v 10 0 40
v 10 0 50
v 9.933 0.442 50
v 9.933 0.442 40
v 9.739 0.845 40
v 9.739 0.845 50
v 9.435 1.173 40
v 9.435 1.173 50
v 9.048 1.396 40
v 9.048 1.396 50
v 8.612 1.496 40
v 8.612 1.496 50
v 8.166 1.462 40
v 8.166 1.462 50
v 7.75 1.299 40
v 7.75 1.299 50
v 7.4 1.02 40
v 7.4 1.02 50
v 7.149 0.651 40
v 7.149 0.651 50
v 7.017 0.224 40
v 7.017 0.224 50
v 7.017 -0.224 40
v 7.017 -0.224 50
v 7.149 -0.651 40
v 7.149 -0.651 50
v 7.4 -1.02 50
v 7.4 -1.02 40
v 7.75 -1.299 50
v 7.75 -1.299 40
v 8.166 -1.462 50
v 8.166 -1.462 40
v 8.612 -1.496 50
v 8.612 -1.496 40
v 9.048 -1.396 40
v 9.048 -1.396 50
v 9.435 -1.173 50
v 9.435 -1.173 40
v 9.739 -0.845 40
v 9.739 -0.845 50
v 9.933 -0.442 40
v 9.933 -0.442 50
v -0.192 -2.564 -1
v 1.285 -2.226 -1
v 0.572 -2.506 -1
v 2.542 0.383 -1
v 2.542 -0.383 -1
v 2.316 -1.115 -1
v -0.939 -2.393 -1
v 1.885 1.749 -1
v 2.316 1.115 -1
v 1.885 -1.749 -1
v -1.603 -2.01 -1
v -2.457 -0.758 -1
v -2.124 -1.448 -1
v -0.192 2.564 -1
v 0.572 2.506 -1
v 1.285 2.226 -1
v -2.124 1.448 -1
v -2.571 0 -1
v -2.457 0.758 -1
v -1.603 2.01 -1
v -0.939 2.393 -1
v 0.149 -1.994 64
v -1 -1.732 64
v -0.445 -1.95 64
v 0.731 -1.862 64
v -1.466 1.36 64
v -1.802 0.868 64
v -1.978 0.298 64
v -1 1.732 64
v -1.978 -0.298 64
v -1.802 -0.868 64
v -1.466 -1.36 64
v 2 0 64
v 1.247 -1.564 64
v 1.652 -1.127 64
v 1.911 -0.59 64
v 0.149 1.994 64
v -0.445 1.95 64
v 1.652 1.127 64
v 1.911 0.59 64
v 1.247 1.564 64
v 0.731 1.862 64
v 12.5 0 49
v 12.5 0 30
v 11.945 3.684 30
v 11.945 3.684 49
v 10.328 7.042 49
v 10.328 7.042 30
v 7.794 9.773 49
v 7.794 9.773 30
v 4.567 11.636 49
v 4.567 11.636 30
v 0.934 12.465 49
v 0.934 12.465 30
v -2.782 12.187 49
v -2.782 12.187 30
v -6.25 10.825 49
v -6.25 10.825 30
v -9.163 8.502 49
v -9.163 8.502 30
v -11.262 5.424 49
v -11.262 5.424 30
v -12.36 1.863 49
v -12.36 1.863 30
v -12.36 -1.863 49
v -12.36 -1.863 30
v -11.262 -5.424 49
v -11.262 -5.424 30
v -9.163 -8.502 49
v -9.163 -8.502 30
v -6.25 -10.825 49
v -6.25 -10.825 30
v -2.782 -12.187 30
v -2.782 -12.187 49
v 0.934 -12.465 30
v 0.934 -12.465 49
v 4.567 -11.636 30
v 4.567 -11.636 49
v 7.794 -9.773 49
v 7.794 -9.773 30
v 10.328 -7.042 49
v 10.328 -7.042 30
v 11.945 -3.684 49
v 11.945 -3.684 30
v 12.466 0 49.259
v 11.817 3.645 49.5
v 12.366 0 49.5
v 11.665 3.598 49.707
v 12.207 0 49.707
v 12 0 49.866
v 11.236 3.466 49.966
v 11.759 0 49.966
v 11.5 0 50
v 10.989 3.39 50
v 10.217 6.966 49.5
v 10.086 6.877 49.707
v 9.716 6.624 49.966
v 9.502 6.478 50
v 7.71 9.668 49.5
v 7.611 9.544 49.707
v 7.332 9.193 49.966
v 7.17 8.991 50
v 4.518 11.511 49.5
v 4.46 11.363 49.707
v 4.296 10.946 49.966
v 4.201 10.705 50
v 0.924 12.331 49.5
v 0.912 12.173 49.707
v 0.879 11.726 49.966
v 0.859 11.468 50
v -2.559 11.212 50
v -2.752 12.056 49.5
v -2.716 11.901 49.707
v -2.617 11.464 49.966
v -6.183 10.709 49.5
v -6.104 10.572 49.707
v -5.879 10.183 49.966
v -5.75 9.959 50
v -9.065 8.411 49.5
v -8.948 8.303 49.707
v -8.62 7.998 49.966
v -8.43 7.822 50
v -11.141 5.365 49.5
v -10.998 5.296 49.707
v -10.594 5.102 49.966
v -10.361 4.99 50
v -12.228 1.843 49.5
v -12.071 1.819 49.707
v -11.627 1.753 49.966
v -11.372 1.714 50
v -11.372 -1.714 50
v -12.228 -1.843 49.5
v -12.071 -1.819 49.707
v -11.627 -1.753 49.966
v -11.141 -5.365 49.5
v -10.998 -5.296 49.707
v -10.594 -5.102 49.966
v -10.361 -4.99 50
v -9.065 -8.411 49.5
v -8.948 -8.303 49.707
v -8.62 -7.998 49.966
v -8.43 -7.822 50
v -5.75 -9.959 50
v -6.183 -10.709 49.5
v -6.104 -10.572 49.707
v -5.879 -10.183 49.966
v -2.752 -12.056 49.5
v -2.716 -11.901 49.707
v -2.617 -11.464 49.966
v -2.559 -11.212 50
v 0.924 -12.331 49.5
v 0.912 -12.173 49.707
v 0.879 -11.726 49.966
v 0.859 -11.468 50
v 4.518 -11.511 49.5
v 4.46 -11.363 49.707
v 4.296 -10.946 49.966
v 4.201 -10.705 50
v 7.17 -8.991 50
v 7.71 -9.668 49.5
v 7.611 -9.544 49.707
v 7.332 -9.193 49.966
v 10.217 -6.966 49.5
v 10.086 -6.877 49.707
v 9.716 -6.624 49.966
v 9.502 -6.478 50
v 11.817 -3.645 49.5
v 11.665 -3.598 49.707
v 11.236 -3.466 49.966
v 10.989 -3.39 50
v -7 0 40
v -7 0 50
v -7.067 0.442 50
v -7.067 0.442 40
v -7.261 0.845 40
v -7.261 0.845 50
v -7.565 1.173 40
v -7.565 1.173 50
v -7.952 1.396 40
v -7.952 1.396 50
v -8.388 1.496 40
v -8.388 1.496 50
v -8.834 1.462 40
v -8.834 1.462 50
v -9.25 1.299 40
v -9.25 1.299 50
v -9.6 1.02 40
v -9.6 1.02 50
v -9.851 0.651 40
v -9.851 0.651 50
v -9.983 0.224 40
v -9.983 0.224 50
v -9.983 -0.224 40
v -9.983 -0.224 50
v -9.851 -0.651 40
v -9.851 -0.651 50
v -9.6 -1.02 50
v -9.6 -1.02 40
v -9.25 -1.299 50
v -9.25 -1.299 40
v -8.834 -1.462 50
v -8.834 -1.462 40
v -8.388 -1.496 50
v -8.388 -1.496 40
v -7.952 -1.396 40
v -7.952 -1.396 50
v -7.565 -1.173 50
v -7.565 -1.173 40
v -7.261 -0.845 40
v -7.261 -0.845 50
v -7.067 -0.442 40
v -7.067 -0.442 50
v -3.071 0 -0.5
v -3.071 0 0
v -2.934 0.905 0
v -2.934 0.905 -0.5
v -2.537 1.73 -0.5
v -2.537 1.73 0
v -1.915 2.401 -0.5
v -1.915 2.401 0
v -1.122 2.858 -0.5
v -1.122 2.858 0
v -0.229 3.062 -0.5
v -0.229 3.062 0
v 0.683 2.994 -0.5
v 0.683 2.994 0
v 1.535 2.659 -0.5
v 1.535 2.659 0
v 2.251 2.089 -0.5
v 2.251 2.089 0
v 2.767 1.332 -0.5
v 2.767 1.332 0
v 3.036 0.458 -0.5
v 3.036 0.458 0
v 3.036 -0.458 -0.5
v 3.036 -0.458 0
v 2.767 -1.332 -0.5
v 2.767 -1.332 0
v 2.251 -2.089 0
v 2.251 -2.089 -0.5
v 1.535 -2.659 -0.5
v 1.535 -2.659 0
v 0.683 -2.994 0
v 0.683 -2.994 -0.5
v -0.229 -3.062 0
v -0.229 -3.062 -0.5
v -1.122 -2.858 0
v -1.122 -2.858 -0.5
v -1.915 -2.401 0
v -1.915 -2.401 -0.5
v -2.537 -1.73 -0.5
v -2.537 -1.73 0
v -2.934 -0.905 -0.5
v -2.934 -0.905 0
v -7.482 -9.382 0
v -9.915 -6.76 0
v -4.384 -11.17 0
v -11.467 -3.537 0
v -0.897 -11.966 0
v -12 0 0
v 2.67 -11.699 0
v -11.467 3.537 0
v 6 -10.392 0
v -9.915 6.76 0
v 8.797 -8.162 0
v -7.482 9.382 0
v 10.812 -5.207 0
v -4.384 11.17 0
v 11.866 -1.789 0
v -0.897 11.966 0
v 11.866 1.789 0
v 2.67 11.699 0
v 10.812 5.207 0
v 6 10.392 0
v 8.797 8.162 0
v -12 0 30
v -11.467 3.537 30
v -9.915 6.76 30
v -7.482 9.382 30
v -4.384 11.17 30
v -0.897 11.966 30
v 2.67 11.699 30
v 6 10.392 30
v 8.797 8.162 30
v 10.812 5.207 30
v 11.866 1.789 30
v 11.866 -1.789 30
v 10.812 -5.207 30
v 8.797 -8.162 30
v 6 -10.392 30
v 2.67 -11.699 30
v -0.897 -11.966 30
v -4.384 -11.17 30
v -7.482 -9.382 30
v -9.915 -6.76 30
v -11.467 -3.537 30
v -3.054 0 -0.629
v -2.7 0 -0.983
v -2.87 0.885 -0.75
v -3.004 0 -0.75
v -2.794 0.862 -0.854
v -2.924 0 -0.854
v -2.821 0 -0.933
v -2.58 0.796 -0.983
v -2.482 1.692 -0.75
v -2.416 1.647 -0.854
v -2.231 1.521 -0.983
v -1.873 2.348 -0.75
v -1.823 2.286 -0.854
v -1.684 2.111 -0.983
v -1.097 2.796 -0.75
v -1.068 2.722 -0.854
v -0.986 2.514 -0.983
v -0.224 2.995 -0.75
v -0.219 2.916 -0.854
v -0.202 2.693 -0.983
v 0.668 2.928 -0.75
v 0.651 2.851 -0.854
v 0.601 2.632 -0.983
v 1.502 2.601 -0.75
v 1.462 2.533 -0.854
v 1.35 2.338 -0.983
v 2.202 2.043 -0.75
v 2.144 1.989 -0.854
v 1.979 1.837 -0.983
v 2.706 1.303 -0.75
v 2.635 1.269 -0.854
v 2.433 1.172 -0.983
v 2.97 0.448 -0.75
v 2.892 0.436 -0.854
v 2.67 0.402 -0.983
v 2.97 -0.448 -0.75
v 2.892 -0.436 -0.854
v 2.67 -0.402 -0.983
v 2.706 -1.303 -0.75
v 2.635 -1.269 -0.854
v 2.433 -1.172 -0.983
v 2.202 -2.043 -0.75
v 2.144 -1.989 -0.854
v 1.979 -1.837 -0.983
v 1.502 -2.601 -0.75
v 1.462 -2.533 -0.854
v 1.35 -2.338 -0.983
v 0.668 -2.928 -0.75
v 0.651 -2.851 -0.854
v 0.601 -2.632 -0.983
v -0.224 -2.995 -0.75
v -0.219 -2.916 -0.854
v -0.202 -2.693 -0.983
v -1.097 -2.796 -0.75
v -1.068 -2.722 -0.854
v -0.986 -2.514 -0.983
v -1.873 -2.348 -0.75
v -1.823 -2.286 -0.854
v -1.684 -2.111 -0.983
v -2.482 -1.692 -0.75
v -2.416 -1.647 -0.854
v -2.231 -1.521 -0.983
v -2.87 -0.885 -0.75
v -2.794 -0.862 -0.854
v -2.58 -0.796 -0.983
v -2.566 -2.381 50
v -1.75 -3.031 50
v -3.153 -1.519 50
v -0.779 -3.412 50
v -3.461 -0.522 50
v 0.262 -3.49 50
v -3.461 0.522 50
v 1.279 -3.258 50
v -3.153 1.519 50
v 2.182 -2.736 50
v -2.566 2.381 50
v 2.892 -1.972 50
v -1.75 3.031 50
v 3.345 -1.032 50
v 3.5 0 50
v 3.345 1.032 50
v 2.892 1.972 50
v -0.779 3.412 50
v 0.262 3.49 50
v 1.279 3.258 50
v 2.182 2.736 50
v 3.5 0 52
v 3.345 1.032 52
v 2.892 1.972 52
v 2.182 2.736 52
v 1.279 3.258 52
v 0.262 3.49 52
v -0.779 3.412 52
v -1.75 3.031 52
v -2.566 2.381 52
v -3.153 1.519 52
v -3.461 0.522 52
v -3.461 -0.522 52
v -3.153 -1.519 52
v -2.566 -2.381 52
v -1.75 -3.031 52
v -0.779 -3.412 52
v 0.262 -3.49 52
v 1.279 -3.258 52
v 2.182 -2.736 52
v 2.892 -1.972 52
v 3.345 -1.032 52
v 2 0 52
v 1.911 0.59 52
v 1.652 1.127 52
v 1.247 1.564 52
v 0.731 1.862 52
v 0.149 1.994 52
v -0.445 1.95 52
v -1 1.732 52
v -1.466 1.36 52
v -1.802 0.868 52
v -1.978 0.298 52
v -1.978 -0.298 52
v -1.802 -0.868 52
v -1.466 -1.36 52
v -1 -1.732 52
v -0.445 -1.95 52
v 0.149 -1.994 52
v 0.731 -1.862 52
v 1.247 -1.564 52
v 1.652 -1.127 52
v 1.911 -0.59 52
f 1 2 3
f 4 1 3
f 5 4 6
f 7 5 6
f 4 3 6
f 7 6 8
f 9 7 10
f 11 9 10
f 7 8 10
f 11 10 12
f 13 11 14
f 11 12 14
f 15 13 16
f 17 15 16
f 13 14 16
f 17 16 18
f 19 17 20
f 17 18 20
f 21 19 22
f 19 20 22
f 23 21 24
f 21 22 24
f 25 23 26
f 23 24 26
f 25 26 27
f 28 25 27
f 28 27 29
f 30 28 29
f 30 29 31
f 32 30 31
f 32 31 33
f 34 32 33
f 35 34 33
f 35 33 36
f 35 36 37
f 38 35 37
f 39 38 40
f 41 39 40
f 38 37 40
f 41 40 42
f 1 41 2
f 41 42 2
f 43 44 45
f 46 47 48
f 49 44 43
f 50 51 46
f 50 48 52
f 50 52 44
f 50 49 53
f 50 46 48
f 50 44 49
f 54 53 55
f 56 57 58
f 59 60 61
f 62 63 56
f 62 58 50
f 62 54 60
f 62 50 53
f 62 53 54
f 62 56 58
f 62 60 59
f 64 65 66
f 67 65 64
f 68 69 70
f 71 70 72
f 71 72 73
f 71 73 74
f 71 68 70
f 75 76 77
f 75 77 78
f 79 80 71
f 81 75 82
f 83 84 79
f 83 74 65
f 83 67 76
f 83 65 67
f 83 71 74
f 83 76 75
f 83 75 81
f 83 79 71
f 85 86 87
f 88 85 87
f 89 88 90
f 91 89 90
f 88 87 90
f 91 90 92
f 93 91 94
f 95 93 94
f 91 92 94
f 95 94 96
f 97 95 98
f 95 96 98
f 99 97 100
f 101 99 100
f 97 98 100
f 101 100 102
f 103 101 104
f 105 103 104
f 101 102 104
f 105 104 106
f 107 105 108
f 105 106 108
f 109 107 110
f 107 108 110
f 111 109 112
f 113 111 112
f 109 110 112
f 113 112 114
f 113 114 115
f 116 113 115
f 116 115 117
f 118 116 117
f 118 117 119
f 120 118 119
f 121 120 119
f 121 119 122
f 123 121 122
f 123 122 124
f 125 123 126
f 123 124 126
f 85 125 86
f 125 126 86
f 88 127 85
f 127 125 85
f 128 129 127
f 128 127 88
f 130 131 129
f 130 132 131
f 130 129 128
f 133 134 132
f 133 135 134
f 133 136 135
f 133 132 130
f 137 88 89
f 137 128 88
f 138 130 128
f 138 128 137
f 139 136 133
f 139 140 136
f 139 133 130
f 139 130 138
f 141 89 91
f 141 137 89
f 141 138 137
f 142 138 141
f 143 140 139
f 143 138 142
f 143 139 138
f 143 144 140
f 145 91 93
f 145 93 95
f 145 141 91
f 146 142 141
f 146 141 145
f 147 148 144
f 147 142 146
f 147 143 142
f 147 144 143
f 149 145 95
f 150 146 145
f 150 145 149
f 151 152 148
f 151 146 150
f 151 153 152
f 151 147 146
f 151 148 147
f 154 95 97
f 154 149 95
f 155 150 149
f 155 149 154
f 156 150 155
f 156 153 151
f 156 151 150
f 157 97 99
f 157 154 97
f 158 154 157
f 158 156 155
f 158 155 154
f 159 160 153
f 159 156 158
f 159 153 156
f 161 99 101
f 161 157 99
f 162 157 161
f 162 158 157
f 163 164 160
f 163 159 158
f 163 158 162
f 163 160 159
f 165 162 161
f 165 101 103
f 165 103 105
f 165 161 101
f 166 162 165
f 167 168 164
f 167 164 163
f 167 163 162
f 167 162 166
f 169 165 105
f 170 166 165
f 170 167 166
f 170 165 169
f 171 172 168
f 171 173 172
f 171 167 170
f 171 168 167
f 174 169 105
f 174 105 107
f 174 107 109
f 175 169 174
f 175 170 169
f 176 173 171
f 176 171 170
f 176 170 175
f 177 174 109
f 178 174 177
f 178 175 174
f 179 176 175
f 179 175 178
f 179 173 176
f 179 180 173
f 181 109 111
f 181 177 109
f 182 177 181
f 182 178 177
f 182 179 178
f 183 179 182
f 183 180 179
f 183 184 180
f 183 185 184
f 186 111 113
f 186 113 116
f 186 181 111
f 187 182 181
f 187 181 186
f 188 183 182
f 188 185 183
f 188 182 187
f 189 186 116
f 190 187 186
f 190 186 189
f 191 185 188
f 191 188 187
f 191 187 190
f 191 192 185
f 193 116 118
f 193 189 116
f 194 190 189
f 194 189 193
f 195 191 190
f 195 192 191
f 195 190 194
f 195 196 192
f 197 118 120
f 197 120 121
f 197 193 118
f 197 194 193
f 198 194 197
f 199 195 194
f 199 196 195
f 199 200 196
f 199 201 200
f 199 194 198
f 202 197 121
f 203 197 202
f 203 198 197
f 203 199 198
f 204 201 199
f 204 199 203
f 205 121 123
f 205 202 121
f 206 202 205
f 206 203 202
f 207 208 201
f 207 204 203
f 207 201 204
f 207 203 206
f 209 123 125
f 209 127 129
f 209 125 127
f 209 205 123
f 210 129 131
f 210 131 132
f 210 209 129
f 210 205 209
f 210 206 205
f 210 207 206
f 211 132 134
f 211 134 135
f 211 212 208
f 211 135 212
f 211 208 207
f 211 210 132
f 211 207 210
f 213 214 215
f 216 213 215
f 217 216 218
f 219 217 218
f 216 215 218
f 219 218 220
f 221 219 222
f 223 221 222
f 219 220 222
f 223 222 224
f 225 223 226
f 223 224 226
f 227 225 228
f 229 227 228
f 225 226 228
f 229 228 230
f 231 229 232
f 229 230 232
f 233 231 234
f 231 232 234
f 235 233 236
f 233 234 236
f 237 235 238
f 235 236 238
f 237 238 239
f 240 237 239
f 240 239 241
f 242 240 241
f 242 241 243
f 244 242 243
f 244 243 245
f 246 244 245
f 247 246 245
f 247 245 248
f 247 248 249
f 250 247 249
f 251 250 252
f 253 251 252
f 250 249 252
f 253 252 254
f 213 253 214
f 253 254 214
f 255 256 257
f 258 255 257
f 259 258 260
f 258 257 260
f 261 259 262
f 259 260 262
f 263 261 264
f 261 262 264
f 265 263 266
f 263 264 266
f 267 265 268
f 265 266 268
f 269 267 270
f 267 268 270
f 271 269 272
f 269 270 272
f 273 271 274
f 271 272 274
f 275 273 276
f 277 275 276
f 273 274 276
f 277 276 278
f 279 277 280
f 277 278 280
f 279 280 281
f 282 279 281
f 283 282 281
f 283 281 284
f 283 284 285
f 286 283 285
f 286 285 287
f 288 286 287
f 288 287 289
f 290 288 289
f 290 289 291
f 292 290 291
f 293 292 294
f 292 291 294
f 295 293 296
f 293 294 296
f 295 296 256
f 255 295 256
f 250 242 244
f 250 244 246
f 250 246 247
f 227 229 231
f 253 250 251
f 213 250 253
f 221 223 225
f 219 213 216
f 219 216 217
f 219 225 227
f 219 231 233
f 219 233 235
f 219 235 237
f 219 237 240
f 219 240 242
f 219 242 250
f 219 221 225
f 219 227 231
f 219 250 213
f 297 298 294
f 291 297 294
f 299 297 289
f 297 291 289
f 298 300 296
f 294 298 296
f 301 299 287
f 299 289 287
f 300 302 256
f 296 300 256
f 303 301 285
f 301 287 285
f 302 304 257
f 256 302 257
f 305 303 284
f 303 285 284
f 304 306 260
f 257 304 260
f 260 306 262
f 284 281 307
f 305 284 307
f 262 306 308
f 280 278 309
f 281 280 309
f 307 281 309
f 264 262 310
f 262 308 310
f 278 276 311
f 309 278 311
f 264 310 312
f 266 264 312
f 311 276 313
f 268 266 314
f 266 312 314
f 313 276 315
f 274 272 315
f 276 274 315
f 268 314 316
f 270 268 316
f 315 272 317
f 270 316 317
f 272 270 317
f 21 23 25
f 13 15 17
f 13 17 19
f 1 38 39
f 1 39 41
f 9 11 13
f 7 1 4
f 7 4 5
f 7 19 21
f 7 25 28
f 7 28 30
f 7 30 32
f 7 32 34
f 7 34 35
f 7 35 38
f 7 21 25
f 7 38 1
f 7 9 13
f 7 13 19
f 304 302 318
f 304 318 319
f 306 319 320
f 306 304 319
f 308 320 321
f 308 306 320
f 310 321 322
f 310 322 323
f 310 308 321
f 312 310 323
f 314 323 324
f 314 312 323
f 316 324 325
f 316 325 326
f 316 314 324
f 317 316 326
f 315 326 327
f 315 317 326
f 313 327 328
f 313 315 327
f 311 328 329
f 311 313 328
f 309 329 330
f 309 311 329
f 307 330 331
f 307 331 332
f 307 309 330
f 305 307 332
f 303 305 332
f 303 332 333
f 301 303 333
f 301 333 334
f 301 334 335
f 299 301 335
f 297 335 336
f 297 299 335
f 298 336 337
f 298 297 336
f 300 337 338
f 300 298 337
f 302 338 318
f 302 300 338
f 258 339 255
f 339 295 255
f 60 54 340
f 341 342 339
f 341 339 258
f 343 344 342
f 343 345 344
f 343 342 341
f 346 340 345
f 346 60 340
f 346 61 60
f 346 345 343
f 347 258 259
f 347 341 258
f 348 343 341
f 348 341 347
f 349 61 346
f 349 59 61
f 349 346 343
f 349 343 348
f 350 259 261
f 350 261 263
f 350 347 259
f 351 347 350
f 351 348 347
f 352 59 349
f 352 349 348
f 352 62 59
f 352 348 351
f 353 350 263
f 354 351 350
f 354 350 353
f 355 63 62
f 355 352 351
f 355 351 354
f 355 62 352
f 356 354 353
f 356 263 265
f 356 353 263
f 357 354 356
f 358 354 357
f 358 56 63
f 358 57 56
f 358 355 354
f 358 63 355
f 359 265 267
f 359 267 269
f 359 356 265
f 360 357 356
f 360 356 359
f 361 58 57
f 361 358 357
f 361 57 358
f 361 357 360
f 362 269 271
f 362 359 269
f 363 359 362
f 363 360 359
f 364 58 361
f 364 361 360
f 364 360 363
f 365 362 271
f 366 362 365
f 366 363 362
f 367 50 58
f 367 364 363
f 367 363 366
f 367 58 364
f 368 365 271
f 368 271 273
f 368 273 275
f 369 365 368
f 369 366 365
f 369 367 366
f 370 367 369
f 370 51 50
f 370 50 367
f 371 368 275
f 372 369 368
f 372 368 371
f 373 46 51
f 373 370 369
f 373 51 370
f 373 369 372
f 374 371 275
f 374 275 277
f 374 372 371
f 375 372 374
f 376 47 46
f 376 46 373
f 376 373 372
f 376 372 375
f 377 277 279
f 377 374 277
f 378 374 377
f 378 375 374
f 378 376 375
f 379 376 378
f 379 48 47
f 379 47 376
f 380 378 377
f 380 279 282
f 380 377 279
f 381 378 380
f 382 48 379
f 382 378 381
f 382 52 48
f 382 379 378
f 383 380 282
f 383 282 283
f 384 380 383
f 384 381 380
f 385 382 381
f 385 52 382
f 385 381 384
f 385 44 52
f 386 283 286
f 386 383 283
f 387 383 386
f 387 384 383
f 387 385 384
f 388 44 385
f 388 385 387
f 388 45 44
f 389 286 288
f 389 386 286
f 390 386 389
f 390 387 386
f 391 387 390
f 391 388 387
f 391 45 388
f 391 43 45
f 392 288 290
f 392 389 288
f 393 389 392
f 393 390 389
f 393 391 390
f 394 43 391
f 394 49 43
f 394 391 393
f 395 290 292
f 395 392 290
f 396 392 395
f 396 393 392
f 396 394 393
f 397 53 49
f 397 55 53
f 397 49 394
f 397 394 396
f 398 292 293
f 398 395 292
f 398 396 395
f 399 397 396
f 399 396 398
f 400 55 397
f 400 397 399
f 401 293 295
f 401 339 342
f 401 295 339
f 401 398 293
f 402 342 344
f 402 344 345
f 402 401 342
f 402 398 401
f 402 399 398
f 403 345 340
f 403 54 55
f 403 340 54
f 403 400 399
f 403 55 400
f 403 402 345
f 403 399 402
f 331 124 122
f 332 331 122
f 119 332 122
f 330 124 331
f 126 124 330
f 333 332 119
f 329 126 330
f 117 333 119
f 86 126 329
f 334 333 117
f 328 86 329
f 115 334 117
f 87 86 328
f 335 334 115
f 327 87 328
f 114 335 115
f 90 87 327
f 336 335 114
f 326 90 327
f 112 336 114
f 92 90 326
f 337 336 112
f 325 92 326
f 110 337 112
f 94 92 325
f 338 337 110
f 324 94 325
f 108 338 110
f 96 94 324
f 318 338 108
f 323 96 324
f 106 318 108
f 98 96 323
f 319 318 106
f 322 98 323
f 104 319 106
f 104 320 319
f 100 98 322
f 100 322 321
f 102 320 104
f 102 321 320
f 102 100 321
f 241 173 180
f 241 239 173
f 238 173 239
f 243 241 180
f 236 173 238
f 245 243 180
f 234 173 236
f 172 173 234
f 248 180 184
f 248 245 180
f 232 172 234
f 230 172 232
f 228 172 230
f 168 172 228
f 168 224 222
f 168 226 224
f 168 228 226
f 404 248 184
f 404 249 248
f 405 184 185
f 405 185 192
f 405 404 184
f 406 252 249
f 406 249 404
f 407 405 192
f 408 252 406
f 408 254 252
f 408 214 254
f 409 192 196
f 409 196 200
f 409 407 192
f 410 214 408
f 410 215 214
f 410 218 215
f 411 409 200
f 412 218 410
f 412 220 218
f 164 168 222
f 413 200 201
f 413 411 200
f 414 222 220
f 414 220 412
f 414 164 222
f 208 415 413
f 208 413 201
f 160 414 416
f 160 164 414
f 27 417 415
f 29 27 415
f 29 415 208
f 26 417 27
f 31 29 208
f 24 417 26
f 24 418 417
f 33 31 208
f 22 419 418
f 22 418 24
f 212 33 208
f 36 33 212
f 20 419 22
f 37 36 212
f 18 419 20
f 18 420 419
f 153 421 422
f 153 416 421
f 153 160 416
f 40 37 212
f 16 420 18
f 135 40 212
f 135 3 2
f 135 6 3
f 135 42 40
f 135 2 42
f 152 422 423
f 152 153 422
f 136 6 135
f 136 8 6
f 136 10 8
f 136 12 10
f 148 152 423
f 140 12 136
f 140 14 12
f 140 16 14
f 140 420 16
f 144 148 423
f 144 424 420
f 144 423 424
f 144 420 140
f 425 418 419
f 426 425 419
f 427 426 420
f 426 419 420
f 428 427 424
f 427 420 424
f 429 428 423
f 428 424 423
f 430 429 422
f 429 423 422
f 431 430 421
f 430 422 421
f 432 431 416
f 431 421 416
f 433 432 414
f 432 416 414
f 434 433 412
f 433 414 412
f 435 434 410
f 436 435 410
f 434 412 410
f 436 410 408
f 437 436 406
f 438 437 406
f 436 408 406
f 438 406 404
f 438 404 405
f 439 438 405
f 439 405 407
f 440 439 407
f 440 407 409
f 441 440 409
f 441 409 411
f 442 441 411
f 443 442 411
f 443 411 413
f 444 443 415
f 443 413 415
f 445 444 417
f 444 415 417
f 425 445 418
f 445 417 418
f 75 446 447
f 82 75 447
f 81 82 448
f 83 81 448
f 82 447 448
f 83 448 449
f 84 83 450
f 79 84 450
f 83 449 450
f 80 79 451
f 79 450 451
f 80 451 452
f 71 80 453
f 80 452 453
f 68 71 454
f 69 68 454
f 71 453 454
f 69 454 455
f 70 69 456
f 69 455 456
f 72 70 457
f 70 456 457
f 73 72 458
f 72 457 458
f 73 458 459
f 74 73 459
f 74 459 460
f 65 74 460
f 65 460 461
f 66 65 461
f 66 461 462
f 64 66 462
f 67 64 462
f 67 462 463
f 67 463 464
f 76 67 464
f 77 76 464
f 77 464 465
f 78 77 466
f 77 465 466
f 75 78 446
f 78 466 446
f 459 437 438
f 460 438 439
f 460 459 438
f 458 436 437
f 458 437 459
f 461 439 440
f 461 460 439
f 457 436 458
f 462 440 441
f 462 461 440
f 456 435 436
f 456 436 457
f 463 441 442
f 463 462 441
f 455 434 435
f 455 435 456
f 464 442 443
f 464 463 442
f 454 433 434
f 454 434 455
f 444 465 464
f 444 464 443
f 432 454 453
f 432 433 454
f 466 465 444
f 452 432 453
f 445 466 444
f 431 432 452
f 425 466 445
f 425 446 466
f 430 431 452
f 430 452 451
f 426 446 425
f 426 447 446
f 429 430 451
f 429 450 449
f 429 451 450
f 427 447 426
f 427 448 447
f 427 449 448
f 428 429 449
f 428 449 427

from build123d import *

# Parameters (mm, degrees)
SKETCH1_R           = 12.5
BOSS_EXTRUDE1_DEPTH = 50
SKETCH2_R           = 3.5
BOSS_EXTRUDE2_DEPTH = 2
SKETCH3_R           = 2
BOSS_EXTRUDE3_DEPTH = 12
SKETCH4_R           = 12.5
SKETCH4_R_2         = 12
CUT_EXTRUDE1_DEPTH  = 30
FILLET1_R           = 1
SKETCH5_R           = 3.070760983
BOSS_EXTRUDE4_DEPTH = 1
FILLET2_R           = 0.5
SKETCH6_R           = 1.5
CUT_EXTRUDE2_DEPTH  = 10


with BuildPart() as part:
    # Sketch1 → Boss-Extrude1 (new body)
    with BuildSketch(Plane.XY):
        Circle(SKETCH1_R)
    extrude(amount=BOSS_EXTRUDE1_DEPTH)

    # Sketch2 → Boss-Extrude2 (add)
    with BuildSketch(Plane.XY.offset(50)):
        Circle(SKETCH2_R)
    extrude(amount=BOSS_EXTRUDE2_DEPTH)

    # Sketch3 → Boss-Extrude3 (add)
    with BuildSketch(Plane.XY.offset(52)):
        Circle(SKETCH3_R)
    extrude(amount=BOSS_EXTRUDE3_DEPTH)

    # Sketch4 → Cut-Extrude1 (cut)
    with BuildSketch(Plane(origin=(0, 0, 0), x_dir=(-1, 0, 0), z_dir=(0, 0, -1))):
        Circle(SKETCH4_R)
        Circle(SKETCH4_R_2, mode=Mode.SUBTRACT)
    extrude(amount=-CUT_EXTRUDE1_DEPTH, mode=Mode.SUBTRACT)

    # Fillet1
    fillet1_edges = [part.edges().sort_by_distance(p)[0] for p in [
        (-12.5, 0, 50),
    ]]
    fillet(fillet1_edges, radius=FILLET1_R)

    # Sketch5 → Boss-Extrude4 (add)
    with BuildSketch(Plane(origin=(0, 0, 0), x_dir=(-1, 0, 0), z_dir=(0, 0, -1))):
        Circle(SKETCH5_R)
    extrude(amount=BOSS_EXTRUDE4_DEPTH)

    # Fillet2
    fillet2_edges = [part.edges().sort_by_distance(p)[0] for p in [
        (3.070760983, 0, -1),
    ]]
    fillet(fillet2_edges, radius=FILLET2_R)

    # Sketch6 → Cut-Extrude2 (cut)
    with BuildSketch(Plane.XY.offset(50)):
        with Locations((8.5, 0)):
            Circle(SKETCH6_R)
        with Locations((-8.5, 0)):
            Circle(SKETCH6_R)
    extrude(amount=-CUT_EXTRUDE2_DEPTH, mode=Mode.SUBTRACT)


solid = part.part
